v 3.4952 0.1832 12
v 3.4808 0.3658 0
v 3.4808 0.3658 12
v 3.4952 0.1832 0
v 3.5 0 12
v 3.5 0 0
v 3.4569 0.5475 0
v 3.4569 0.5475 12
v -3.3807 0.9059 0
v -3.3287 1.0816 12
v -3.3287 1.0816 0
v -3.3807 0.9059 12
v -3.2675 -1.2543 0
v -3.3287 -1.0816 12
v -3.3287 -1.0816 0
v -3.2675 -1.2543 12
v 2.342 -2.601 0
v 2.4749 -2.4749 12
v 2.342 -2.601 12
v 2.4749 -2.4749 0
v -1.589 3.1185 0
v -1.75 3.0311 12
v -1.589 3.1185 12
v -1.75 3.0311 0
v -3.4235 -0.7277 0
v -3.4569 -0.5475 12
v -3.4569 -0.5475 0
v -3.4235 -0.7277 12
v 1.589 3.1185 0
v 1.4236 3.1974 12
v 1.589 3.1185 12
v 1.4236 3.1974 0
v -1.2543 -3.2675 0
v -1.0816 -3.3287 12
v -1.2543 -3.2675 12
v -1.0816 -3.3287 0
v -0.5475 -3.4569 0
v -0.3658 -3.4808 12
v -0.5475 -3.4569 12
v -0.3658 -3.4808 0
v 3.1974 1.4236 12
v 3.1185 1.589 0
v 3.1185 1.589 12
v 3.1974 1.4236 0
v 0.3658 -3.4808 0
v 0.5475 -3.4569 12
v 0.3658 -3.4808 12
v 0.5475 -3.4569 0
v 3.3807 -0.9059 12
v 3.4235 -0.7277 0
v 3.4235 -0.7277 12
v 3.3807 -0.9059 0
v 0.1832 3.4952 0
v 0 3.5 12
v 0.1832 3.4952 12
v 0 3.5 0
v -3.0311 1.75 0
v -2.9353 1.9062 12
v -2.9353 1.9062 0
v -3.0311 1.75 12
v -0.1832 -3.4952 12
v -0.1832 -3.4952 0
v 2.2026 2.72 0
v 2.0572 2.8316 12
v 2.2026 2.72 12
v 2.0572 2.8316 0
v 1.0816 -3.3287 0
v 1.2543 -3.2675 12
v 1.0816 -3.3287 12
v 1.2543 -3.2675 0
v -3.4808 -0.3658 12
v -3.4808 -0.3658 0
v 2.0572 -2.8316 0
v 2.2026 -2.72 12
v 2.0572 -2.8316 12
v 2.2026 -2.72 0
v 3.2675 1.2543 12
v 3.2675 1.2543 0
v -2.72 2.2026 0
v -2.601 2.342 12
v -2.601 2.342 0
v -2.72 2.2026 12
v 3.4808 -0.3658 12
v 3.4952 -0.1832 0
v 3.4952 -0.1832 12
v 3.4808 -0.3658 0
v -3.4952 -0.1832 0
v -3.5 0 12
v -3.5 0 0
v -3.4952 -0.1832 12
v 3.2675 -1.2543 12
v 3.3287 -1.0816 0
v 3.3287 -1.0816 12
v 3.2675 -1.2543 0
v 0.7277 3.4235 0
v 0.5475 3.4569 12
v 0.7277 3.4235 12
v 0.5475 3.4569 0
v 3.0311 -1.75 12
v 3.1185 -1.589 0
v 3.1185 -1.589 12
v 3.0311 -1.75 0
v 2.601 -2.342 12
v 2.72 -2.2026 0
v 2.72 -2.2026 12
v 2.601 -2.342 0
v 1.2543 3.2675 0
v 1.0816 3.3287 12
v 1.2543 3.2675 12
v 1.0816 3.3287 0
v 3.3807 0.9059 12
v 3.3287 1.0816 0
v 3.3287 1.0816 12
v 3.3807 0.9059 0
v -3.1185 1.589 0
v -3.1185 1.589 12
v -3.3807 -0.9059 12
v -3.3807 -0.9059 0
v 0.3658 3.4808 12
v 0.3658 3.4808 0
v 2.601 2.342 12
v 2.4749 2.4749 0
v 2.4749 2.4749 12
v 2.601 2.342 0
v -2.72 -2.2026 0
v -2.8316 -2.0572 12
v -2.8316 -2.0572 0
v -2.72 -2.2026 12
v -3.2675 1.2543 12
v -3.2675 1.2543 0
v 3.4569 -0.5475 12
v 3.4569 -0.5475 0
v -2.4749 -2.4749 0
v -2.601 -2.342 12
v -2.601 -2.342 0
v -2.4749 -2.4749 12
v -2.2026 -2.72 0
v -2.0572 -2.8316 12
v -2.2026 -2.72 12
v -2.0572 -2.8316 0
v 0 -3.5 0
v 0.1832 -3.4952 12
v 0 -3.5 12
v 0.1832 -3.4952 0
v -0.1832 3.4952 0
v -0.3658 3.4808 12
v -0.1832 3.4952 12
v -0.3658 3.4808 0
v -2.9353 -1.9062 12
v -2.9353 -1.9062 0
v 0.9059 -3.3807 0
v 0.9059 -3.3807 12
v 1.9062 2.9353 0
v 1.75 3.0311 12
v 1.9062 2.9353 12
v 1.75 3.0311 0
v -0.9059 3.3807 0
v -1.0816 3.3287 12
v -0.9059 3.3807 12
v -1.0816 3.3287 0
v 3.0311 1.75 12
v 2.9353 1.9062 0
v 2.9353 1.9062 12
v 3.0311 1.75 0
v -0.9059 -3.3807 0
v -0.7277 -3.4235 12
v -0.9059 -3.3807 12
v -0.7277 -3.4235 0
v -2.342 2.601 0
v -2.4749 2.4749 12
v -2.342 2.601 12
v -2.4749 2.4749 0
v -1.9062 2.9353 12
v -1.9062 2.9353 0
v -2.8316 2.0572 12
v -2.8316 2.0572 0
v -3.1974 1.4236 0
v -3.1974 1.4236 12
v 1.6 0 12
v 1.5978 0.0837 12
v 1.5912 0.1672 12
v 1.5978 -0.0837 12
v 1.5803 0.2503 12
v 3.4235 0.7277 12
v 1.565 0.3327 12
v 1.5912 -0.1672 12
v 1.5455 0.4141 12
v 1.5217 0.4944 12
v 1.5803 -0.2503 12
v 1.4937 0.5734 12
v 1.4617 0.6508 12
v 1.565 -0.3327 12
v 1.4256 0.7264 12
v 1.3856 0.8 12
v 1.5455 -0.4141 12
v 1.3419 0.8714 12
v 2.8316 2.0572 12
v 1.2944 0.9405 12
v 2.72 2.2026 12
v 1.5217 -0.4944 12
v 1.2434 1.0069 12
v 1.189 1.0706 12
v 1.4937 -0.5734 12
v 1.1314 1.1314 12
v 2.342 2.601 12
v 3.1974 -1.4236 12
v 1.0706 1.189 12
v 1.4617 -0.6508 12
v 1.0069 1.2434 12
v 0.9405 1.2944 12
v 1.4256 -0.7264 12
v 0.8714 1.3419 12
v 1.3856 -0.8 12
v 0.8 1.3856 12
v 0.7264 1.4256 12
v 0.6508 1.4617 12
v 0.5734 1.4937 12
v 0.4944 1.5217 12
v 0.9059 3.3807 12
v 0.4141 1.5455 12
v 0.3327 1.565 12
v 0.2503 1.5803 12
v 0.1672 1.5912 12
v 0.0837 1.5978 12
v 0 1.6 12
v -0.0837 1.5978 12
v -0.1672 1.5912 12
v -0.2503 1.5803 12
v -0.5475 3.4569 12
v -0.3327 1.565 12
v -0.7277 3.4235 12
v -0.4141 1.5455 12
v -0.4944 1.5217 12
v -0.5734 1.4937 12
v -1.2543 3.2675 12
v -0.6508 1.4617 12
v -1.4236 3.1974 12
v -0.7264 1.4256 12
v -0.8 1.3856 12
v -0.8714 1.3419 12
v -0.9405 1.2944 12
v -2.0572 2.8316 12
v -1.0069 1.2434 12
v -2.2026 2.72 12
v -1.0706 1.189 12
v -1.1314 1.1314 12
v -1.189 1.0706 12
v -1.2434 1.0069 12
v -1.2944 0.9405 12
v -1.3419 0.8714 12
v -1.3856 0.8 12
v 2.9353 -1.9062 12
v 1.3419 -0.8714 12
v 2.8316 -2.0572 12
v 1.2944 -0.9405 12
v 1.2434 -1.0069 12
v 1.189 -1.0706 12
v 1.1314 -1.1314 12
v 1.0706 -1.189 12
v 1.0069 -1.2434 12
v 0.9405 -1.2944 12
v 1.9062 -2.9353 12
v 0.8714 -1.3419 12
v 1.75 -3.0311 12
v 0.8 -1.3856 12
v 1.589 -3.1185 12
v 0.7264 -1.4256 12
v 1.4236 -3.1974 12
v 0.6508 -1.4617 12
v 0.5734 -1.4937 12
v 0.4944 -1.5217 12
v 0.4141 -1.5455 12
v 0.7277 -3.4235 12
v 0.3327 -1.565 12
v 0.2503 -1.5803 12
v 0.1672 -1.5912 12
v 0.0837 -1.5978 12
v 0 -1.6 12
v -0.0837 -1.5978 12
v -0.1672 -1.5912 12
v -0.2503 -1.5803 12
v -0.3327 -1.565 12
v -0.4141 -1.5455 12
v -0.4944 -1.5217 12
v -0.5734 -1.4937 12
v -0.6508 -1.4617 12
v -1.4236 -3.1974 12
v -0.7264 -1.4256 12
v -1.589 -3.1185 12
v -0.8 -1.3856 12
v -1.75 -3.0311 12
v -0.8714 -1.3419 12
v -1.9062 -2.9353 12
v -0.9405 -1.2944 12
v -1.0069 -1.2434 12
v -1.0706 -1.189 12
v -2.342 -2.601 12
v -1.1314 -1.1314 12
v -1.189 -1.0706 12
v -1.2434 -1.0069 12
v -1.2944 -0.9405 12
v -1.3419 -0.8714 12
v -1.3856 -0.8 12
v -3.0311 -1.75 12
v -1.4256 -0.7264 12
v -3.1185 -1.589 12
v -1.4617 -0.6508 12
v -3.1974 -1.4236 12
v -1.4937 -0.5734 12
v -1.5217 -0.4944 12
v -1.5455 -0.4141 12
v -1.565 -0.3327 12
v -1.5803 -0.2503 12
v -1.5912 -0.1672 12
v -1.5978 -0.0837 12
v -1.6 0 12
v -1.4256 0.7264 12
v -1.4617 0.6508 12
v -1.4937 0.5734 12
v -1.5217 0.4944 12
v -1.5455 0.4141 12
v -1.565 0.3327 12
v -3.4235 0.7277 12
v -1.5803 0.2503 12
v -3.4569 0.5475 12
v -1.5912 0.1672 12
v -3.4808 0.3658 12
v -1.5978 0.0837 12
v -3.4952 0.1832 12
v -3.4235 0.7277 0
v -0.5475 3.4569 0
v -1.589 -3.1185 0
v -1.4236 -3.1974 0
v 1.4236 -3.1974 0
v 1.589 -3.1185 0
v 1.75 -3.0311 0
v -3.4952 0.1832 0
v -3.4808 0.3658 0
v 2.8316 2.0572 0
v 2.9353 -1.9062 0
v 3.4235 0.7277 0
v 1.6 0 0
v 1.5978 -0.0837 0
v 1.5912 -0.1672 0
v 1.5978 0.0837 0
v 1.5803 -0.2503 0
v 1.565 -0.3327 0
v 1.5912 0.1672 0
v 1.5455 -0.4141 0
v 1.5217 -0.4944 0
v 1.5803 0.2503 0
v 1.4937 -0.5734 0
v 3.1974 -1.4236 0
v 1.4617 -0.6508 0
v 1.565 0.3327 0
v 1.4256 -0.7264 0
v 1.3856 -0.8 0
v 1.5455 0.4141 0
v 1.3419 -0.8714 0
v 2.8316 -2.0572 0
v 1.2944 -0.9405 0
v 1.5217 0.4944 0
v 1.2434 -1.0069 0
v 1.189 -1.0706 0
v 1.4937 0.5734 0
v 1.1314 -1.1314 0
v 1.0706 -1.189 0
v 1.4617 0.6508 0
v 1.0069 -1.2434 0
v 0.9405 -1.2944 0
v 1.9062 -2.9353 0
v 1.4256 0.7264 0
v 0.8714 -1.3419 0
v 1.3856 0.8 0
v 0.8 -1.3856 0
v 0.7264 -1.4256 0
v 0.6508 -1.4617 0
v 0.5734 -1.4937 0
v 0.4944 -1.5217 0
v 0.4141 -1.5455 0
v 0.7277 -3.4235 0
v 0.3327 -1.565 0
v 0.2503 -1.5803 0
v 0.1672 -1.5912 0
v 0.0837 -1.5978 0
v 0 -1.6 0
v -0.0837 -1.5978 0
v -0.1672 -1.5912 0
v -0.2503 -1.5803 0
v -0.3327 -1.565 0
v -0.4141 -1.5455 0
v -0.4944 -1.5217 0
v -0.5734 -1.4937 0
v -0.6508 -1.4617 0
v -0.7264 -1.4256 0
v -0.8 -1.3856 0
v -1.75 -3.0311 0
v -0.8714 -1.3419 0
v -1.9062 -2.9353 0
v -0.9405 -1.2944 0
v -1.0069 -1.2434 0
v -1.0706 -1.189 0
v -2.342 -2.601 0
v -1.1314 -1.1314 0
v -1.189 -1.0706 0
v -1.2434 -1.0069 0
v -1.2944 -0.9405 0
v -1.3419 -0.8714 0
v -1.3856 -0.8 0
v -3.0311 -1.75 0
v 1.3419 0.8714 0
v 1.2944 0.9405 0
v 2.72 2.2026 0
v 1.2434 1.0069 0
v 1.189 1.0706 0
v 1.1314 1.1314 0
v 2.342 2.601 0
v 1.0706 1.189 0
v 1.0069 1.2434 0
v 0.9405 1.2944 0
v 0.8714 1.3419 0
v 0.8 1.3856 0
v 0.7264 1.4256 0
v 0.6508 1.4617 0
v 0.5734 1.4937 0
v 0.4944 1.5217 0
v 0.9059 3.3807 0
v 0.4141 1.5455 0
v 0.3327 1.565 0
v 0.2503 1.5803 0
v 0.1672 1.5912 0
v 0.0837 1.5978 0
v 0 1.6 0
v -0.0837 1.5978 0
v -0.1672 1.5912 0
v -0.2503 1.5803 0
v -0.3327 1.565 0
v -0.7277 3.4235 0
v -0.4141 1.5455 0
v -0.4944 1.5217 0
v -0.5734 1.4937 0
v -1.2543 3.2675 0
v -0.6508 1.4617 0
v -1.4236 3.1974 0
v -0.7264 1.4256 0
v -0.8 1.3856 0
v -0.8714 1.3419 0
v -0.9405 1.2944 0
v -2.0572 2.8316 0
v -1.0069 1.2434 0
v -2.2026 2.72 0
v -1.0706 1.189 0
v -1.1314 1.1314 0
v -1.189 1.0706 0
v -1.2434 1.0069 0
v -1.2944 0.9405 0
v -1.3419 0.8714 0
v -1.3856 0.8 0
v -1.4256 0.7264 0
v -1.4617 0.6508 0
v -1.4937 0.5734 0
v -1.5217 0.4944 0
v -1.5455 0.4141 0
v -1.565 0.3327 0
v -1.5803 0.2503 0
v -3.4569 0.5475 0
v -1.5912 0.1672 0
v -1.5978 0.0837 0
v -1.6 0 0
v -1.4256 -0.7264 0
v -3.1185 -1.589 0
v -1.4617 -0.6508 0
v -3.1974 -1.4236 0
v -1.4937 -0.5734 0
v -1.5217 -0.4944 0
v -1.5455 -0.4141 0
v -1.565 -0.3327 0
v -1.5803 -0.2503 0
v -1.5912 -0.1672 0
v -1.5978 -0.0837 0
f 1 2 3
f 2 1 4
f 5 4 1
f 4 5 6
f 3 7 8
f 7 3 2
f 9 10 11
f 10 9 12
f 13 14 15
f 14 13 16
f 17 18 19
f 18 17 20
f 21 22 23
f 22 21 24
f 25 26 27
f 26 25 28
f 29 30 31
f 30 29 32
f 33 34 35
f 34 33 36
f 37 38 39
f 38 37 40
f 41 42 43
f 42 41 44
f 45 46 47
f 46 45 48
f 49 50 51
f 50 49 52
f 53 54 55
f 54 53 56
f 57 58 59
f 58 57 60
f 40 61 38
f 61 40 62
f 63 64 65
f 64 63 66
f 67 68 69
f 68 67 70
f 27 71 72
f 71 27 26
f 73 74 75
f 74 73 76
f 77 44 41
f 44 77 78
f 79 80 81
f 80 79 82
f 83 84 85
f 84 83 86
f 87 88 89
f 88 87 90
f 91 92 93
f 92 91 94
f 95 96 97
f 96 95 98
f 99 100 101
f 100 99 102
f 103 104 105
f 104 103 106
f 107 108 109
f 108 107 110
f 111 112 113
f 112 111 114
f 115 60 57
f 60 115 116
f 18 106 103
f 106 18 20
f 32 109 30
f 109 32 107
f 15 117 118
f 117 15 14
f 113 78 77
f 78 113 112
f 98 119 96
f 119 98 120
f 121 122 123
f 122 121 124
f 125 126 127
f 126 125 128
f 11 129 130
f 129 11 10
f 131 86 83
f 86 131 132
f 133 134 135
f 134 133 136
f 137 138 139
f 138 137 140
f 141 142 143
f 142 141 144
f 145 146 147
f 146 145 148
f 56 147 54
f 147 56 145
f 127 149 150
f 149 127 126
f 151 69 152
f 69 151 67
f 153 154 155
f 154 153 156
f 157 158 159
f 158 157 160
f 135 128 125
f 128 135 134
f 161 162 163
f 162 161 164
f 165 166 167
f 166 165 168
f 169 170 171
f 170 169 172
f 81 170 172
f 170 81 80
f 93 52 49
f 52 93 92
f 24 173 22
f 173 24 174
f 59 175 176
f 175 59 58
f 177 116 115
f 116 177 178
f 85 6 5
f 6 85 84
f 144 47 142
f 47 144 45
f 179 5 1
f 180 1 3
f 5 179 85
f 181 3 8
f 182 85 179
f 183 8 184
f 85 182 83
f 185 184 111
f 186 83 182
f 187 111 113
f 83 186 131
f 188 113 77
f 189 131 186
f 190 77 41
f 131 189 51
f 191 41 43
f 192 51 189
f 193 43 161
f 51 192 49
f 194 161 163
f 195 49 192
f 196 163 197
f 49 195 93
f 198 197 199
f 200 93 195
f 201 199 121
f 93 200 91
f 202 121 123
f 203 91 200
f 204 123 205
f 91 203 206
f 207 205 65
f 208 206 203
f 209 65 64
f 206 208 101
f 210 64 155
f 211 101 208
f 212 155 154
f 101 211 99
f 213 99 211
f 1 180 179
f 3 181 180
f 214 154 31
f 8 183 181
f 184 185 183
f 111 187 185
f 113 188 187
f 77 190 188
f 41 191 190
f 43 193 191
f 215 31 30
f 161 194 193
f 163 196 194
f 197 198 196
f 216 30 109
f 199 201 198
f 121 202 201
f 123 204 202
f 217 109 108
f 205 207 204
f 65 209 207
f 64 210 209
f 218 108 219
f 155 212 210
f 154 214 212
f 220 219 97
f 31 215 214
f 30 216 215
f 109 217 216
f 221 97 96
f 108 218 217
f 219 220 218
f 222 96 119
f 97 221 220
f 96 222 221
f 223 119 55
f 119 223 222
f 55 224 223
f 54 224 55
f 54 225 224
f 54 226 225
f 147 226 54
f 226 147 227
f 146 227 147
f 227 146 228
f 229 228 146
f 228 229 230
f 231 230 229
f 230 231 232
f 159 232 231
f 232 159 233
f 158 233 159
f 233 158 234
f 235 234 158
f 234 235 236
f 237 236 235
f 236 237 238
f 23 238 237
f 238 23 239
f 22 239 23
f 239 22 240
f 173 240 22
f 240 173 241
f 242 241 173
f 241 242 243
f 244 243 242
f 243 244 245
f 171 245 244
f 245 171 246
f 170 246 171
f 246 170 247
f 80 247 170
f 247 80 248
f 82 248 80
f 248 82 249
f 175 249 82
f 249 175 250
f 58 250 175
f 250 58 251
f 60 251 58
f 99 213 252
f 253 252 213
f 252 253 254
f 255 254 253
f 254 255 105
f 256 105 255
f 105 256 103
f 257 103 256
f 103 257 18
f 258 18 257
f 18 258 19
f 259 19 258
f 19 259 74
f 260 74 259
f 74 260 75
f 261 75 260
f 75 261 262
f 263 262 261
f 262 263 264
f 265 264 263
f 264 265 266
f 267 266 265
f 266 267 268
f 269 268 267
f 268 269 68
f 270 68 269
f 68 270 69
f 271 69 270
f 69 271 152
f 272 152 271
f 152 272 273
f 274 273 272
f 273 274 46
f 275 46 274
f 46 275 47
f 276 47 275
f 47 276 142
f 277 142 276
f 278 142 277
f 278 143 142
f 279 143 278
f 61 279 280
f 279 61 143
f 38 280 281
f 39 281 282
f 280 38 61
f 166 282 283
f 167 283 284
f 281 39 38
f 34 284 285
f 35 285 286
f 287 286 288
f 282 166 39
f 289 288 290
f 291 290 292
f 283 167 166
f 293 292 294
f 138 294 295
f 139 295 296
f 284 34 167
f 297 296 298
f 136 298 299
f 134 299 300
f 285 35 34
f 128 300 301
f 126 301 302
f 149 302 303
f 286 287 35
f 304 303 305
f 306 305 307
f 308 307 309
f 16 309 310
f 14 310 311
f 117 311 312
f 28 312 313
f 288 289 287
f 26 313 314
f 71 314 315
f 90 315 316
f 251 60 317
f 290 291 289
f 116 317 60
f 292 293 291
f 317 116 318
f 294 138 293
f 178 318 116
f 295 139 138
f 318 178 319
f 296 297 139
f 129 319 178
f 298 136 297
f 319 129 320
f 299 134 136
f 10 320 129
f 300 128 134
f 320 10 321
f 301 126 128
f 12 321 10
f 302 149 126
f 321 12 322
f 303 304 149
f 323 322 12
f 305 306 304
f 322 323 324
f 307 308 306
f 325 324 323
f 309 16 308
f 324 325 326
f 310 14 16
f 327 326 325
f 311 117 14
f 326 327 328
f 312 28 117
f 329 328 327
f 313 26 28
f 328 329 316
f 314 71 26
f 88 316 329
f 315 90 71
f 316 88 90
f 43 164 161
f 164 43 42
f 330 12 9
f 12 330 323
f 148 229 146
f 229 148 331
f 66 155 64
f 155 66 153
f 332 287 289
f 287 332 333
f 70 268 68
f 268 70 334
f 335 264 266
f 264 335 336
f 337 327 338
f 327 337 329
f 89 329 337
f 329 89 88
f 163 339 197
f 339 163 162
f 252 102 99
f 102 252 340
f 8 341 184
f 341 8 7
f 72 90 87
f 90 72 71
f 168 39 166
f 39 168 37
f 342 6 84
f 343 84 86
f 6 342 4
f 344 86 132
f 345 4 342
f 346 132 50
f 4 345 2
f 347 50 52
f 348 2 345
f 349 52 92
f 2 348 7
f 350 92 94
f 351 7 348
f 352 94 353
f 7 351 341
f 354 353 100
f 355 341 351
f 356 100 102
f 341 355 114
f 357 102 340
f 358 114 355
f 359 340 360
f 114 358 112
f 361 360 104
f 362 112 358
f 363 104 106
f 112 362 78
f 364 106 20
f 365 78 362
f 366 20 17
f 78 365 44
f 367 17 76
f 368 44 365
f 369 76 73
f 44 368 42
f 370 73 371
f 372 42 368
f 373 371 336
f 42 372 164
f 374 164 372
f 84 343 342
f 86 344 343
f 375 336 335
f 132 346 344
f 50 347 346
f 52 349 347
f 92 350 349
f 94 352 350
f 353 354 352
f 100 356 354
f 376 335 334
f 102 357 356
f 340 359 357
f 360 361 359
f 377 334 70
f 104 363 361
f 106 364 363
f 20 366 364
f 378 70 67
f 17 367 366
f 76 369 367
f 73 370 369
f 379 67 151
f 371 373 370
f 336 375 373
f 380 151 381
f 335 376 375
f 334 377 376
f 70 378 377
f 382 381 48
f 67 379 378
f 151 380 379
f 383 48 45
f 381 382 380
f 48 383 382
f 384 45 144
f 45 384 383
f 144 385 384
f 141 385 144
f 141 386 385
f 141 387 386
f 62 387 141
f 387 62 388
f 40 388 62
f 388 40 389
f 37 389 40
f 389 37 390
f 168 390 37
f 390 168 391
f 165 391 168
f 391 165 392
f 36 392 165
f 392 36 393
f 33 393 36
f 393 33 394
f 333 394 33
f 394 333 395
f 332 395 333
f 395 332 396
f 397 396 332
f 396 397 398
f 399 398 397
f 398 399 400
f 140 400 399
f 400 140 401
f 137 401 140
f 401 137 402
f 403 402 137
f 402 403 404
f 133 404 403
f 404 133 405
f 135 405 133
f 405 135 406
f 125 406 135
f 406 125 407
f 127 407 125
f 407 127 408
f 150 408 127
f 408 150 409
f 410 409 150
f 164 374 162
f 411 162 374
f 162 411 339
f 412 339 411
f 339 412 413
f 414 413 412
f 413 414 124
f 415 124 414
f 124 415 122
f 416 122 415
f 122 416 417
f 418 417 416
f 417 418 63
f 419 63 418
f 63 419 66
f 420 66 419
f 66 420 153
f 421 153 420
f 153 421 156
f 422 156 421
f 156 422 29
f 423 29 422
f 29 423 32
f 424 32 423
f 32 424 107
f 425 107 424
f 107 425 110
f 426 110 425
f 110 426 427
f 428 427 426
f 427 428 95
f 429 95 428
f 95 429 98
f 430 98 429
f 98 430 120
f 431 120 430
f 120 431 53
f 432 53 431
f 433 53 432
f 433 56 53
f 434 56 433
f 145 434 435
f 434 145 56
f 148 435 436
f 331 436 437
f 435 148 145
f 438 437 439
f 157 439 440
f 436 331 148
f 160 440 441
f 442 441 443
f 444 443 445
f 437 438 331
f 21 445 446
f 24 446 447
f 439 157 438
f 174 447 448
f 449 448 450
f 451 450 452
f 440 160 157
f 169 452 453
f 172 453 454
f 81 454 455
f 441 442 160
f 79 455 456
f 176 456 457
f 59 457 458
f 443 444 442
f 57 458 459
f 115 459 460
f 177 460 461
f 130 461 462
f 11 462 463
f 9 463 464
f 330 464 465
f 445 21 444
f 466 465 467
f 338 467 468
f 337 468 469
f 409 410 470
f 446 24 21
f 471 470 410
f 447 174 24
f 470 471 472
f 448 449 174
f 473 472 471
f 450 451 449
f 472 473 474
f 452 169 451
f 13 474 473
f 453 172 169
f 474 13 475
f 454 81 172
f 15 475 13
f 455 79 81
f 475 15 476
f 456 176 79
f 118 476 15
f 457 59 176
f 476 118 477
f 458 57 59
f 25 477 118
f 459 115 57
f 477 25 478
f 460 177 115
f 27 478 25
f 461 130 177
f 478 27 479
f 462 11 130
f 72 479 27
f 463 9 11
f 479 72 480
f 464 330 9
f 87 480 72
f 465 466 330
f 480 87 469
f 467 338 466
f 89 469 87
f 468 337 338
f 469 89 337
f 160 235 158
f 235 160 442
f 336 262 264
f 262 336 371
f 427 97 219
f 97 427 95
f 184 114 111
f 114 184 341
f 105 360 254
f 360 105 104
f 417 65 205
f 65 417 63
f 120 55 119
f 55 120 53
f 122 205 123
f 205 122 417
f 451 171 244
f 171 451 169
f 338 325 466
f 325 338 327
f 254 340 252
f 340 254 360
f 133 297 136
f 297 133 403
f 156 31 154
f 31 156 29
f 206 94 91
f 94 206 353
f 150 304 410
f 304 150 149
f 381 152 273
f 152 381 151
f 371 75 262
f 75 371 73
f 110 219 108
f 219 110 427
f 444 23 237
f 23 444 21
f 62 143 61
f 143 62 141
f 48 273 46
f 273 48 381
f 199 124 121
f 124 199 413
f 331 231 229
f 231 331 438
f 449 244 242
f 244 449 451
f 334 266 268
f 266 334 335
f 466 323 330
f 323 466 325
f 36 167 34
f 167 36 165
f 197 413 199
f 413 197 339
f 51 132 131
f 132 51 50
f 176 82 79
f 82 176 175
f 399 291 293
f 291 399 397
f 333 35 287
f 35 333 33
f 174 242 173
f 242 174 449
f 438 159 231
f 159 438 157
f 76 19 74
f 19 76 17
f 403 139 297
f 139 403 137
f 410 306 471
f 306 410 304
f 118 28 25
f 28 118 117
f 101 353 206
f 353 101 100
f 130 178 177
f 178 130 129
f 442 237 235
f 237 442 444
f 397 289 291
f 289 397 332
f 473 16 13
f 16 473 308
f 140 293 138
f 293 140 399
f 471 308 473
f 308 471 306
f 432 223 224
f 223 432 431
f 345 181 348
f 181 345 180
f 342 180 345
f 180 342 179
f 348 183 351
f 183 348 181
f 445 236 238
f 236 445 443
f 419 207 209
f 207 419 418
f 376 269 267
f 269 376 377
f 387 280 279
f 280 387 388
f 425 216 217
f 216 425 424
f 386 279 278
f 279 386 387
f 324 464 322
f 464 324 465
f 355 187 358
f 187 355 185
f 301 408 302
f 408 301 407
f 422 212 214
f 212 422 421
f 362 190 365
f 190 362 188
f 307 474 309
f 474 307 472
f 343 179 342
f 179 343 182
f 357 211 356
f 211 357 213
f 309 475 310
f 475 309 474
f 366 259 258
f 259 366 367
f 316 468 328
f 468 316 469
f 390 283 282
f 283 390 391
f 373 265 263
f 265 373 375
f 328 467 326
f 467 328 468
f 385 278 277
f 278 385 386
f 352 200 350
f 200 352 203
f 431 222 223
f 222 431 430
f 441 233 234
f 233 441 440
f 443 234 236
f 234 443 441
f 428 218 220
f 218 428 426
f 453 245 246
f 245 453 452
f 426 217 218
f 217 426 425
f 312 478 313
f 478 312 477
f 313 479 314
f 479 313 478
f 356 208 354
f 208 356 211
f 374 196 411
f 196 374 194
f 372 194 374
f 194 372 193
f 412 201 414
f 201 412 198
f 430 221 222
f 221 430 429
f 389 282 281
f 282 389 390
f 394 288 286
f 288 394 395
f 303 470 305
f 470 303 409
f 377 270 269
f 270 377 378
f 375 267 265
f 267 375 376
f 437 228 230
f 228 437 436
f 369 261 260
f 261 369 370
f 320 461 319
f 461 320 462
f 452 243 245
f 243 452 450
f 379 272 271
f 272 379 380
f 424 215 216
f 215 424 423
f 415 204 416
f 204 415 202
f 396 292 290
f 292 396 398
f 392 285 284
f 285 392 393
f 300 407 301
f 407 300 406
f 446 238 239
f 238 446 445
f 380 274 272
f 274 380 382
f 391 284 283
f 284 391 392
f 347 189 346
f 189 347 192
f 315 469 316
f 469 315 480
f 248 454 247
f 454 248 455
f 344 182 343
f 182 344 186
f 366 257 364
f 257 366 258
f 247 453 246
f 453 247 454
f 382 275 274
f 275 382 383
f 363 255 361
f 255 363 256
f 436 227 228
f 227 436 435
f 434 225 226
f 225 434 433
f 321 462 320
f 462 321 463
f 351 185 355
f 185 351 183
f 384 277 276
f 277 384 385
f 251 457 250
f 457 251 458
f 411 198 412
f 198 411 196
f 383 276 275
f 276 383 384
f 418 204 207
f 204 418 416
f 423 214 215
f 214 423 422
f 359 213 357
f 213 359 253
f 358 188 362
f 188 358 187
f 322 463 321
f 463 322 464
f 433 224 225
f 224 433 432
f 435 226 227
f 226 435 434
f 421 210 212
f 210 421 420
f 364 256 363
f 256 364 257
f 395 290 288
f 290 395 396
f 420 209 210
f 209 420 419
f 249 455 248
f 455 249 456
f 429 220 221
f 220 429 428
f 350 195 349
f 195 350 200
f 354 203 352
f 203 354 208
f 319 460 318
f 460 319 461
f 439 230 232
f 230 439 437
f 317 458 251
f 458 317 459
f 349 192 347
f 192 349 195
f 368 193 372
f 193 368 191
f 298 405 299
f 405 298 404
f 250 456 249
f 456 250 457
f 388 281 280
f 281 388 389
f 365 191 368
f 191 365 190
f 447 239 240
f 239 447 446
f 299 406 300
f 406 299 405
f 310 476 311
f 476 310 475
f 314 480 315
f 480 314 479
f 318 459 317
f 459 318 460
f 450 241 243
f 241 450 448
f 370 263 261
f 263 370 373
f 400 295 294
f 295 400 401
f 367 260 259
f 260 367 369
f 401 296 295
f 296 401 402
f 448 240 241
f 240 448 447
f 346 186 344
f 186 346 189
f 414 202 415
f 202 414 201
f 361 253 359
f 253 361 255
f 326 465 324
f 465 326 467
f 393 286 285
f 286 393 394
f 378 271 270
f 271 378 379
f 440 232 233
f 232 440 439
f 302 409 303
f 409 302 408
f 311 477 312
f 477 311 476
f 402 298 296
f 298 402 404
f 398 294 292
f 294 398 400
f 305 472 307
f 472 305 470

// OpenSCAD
// file: C:/gh/oomlout_oobb_part_motor_gearbox_wave_drive_version_5/parts/oobb_part_motor_gearbox_wave_drive_version_5_12_to_1_reduction/compact_helpers.scad
// Reusable native geometry helpers.
function polar(r,a)=[r*cos(a),r*sin(a)];
function rotate_point(p,a)=[p[0]*cos(a)-p[1]*sin(a),p[0]*sin(a)+p[1]*cos(a)];
function profile_point(t)=let(
    s=sqrt(pow(pitch_radius,2)-pow(eccentricity*sin(cavity_count*t),2)),
    r=eccentricity*cos(cavity_count*t)+s,
    xi=atan2(eccentricity*cavity_count*sin(cavity_count*t),s),
    rr=roller_radius+profile_clearance)
    [r*cos(t)+rr*cos(t+xi),r*sin(t)+rr*sin(t+xi)];
function profile_points(upper=false)=[for(i=[0:cavity_count*profile_samples_per_cavity-1])
    rotate_point(profile_point(360*i/(cavity_count*profile_samples_per_cavity)),0)];
function roller_position(i,a,upper=false)=let(
    t=-a/roller_count+360*i/roller_count,
    rel=t-a-(upper?180:0),
    r=eccentricity*cos(rel)+sqrt(pow(pitch_radius,2)-pow(eccentricity*sin(rel),2))) polar(r,t);
module tube(ro,ri,h) { difference() { cylinder(r=ro,h=h); translate([0,0,-eps]) cylinder(r=ri,h=h+2*eps); } }
module screw_hole(size,h) { scale([1,1,h]) { if(size=="m2") oobb_hole_m2(); if(size=="m3") oobb_hole_m3(); if(size=="m6") oobb_hole_m6(); } }
module socket_recess(size,depth) {
    // OOBB socket head starts at the under-head plane and extends outward.
    scale([1,1,depth/(size=="m3"?3.2:2.2)]) {
        if(size=="m3") oobb_socket_m3(); else oobb_socket_m2();
    }
}
module at_mounts(points) { for(p=points) translate([p[0],p[1],0]) children(); }
module shaft_cut(h,fit=shaft_fit_clearance) {
    linear_extrude(h) intersection() {
        circle(r=input_shaft_diameter/2+fit);
        translate([-10,-10]) square([10+input_shaft_diameter/2-input_shaft_flat_depth+fit,20]);
    }
}
module rounded_rectangle_plate(size=[119,119,3],radius=1.5) {
    hull() for(x=[-1,1],y=[-1,1]) translate([x*(size[0]/2-radius),y*(size[1]/2-radius),0]) cylinder(r=radius,h=size[2]);
}
module grid_cuts(h) {
    // Actual OOBB grid centres: six units are centred on half-pitch offsets.
    for(i=[0:base_width-1],j=[0:base_height-1])
        let(x=(i-(base_width-1)/2)*oobb_grid_pitch,y=(j-(base_height-1)/2)*oobb_grid_pitch)
        if(sqrt(x*x+y*y)>housing_radius+3.5)
            translate([x,y,-eps]) screw_hole("m6",h+2*eps);
}
module wave_generator() {
    render(convexity=20) difference() {
        tube(wave_radius,12.6,wave_height);
        translate([0,0,wave_seat_z]) cylinder(r=13.5+bearing_seat_clearance,h=wave_height);
        translate([0,0,wave_height-wave_cap_depth]) cylinder(r=22.15,h=wave_cap_depth+eps);
        at_mounts(wave_mounts) {
            translate([0,0,-eps]) screw_hole("m3",wave_height+2*eps);
            translate([0,0,wave_nut_z]) scale([1,1,(wave_height-wave_cap_depth-wave_nut_z+eps)/2.7]) oobb_nut_m3();
        }
    }
}
module wave_cap() {
    render(convexity=20) difference() {
        tube(22,12.6,wave_cap_depth);
        at_mounts(wave_mounts) {
            translate([0,0,-eps]) screw_hole("m3",wave_cap_depth+2*eps);
            translate([0,0,wave_cap_depth-wave_head_recess]) socket_recess("m3",wave_head_recess+eps);
        }
    }
}
// file: C:/gh/oomlout_oobb_part_motor_gearbox_wave_drive_version_5/parts/oobb_part_motor_gearbox_wave_drive_version_5_12_to_1_reduction/oobb_hardware.scad
module oobb_rounded_rectangle_edges(size, radius, radius_top, radius_bottom) {
      rt=radius_top; rb=radius_bottom; depth=size[2]; n=16;
      lower=rb==0 ? [[radius,0]] :
        [for(i=[0:n]) let(a=-90+90*i/n) [radius-rb+rb*cos(a),rb+rb*sin(a)]];
      upper=rt==0 ? [[radius,depth]] :
        [for(i=[0:n]) let(a=90*i/n) [radius-rt+rt*cos(a),depth-rt+rt*sin(a)]];
      hull() for(x=[-size[0]/2+radius,size[0]/2-radius])
        for(y=[-size[1]/2+radius,size[1]/2-radius])
          translate([x,y,0]) rotate_extrude()
            polygon(concat([[0,0]],lower,upper,[[0,depth]]));
    }
// Generated from installed OOBB v5. All primitives use overhang=True.

module oobb_motor_plate_body() {


difference() {
	union() {
		translate(v = [0, 0, 0]) {
			rotate(a = [0, 0, 0]) {
				difference() {
					union() {
						oobb_rounded_rectangle_edges(radius = 1.5, radius_bottom = 1.5, radius_top = 1.5, size = [89.0, 89.0, 4.0]);
					}
					union();
				}
			}
		}
	}
	union();
}

}

module oobb_hole_m2() {


difference() {
	union() {
		cylinder(h = 1, r = 1.35);
	}
	union();
}

}

module oobb_hole_m3() {


difference() {
	union() {
		cylinder(h = 1, r = 1.8);
	}
	union();
}

}

module oobb_hole_m6() {


difference() {
	union() {
		cylinder(h = 1, r = 3.25);
	}
	union();
}

}

module oobb_nut_m2() {


difference() {
	union() {
		translate(v = [0, 0, 0]) {
			rotate(a = [0, 0, 0]) {
				difference() {
					union() {
						linear_extrude(height = 2.2) {
							polygon(points = [[2.4234, 0.0], [1.2117000000000002, 2.0987259635312085], [-1.2116999999999996, 2.0987259635312085], [-2.4234, 2.967809053053696e-16], [-1.211700000000001, -2.098725963531208], [1.2116999999999984, -2.0987259635312094]]);
						}
						translate(v = [-1.25, -2.75, -0.3]) {
							cube(size = [2.5, 5.5, 0.3]);
						}
						translate(v = [-1.25, -1.25, -0.6]) {
							cube(size = [2.5, 2.5, 0.3]);
						}
						translate(v = [-1.25, -2.75, 2.2]) {
							cube(size = [2.5, 5.5, 0.3]);
						}
						translate(v = [-1.25, -1.25, 2.5]) {
							cube(size = [2.5, 2.5, 0.3]);
						}
					}
					union();
				}
			}
		}
	}
	union();
}

}

module oobb_socket_m2() {


difference() {
	union() {
		translate(v = [0, 0, 0]) {
			rotate(a = [0, 0, 0]) {
				difference() {
					union() {
						cylinder(h = 2.2, r = 2.1);
						translate(v = [-1.25, -2.75, -0.3]) {
							cube(size = [2.5, 5.5, 0.3]);
						}
						translate(v = [-1.25, -1.25, -0.6]) {
							cube(size = [2.5, 2.5, 0.3]);
						}
					}
					union();
				}
			}
		}
	}
	union();
}

}

module oobb_nut_m3() {


difference() {
	union() {
		translate(v = [0, 0, 0]) {
			rotate(a = [0, 0, 0]) {
				difference() {
					union() {
						linear_extrude(height = 2.7) {
							polygon(points = [[3.4619999999999997, 0.0], [1.7310000000000003, 2.9981799479017264], [-1.7309999999999992, 2.9981799479017264], [-3.4619999999999997, 4.2397272186481365e-16], [-1.7310000000000014, -2.998179947901726], [1.7309999999999977, -2.9981799479017277]]);
						}
						translate(v = [-1.75, -3.25, -0.3]) {
							cube(size = [3.5, 6.5, 0.3]);
						}
						translate(v = [-1.75, -1.75, -0.6]) {
							cube(size = [3.5, 3.5, 0.3]);
						}
						translate(v = [-1.75, -3.25, 2.7]) {
							cube(size = [3.5, 6.5, 0.3]);
						}
						translate(v = [-1.75, -1.75, 3.0]) {
							cube(size = [3.5, 3.5, 0.3]);
						}
					}
					union();
				}
			}
		}
	}
	union();
}

}

module oobb_socket_m3() {


difference() {
	union() {
		translate(v = [0, 0, 0]) {
			rotate(a = [0, 0, 0]) {
				difference() {
					union() {
						cylinder(h = 3.2, r = 3.0);
						translate(v = [-1.75, -3.25, -0.3]) {
							cube(size = [3.5, 6.5, 0.3]);
						}
						translate(v = [-1.75, -1.75, -0.6]) {
							cube(size = [3.5, 3.5, 0.3]);
						}
					}
					union();
				}
			}
		}
	}
	union();
}

}

module oobb_nut_m6() {


difference() {
	union() {
		translate(v = [0, 0, 0]) {
			rotate(a = [0, 0, 0]) {
				difference() {
					union() {
						linear_extrude(height = 5.2) {
							polygon(points = [[5.914249999999999, 0.0], [2.957125, 5.1218907443321156], [-2.9571249999999982, 5.1218907443321156], [-5.914249999999999, 7.242867331857232e-16], [-2.9571250000000022, -5.121890744332115], [2.9571249999999956, -5.121890744332118]]);
						}
						translate(v = [-2.875, -5.0, -0.3]) {
							cube(size = [5.75, 10, 0.3]);
						}
						translate(v = [-2.875, -2.875, -0.6]) {
							cube(size = [5.75, 5.75, 0.3]);
						}
						translate(v = [-2.875, -5.0, 5.2]) {
							cube(size = [5.75, 10, 0.3]);
						}
						translate(v = [-2.875, -2.875, 5.5]) {
							cube(size = [5.75, 5.75, 0.3]);
						}
					}
					union();
				}
			}
		}
	}
	union();
}

}
// file: C:/gh/oomlout_oobb_part_motor_gearbox_wave_drive_version_5/parts/oobb_part_motor_gearbox_wave_drive_version_5_12_to_1_reduction/parameters.scad
// Generated by working_scad.py. Edit the Python recipe to persist changes.
style = "version_5";
reduction = 12;
bearing_output = "6810";
bearing_wave = "6704";
roller_diameter = 7.0;
roller_bore_diameter = 3.2;
roller_length = 12.0;
roller_material = "nylon";
roller_bank_count = 1;
motor_plate_depth = 4.0;
motor_body_depth = 40.0;
motor_shaft_length = 24.0;
motor_hole_pitch = 31.0;
motor_thread_depth = 6.0;
motor_pilot_diameter = 22.0;
motor_pilot_height = 2.0;
output_holder_wall = 7.0;
max_screw_length = 35.0;
eccentricity = 0.75;
wave_radius = 23.25;
profile_clearance = 0.15;
roller_slot_clearance = 0.3;
roller_end_clearance = 0.3;
cage_wall = 4.0;
cage_plate_depth = 3.0;
bearing_seat_clearance = 0.1;
journal_clearance = 0.05;
bearing_axial_clearance = 0.2;
output_plate_diameter = 65.0;
output_plate_depth = 6.0;
output_grid_pitch = 15.0;
output_face_clearance = 0.3;
output_socket_recess = 4.0;
output_screw_length = 16;
output_nut_depth = 5.2;
output_nut_height = 5.0;
motor_shaft_end_clearance = 0.5;
base_width = 6;
base_height = 6;
oobb_grid_pitch = 15.0;
oobb_size_allowance = 1.0;
base_edge_radius = 1.5;
housing_flange_corner_radius = 1.5;
housing_screw_pitch_radius = 35.5;
housing_screw_count = 6;
input_shaft_diameter = 5.0;
input_shaft_flat_depth = 0.5;
shaft_fit_clearance = 0.1;
cage_screw_count = 4;
profile_samples_per_cavity = 100;
circle_fragments = 120;
overhang = true;
run_scad = true;
run_solidcraft = false;
generate_stl = true;
generate_previews = true;
generate_renders = true;
validate_geometry = true;
package_outputs = true;
render_threads = 8;
variant = "default";
// main file
include <C:/gh/oomlout_oobb_part_motor_gearbox_wave_drive_version_5/parts/oobb_part_motor_gearbox_wave_drive_version_5_12_to_1_reduction/parameters.scad>
include <C:/gh/oomlout_oobb_part_motor_gearbox_wave_drive_version_5/parts/oobb_part_motor_gearbox_wave_drive_version_5_12_to_1_reduction/oobb_hardware.scad>
include <C:/gh/oomlout_oobb_part_motor_gearbox_wave_drive_version_5/parts/oobb_part_motor_gearbox_wave_drive_version_5_12_to_1_reduction/geometry.scad>
roller();
